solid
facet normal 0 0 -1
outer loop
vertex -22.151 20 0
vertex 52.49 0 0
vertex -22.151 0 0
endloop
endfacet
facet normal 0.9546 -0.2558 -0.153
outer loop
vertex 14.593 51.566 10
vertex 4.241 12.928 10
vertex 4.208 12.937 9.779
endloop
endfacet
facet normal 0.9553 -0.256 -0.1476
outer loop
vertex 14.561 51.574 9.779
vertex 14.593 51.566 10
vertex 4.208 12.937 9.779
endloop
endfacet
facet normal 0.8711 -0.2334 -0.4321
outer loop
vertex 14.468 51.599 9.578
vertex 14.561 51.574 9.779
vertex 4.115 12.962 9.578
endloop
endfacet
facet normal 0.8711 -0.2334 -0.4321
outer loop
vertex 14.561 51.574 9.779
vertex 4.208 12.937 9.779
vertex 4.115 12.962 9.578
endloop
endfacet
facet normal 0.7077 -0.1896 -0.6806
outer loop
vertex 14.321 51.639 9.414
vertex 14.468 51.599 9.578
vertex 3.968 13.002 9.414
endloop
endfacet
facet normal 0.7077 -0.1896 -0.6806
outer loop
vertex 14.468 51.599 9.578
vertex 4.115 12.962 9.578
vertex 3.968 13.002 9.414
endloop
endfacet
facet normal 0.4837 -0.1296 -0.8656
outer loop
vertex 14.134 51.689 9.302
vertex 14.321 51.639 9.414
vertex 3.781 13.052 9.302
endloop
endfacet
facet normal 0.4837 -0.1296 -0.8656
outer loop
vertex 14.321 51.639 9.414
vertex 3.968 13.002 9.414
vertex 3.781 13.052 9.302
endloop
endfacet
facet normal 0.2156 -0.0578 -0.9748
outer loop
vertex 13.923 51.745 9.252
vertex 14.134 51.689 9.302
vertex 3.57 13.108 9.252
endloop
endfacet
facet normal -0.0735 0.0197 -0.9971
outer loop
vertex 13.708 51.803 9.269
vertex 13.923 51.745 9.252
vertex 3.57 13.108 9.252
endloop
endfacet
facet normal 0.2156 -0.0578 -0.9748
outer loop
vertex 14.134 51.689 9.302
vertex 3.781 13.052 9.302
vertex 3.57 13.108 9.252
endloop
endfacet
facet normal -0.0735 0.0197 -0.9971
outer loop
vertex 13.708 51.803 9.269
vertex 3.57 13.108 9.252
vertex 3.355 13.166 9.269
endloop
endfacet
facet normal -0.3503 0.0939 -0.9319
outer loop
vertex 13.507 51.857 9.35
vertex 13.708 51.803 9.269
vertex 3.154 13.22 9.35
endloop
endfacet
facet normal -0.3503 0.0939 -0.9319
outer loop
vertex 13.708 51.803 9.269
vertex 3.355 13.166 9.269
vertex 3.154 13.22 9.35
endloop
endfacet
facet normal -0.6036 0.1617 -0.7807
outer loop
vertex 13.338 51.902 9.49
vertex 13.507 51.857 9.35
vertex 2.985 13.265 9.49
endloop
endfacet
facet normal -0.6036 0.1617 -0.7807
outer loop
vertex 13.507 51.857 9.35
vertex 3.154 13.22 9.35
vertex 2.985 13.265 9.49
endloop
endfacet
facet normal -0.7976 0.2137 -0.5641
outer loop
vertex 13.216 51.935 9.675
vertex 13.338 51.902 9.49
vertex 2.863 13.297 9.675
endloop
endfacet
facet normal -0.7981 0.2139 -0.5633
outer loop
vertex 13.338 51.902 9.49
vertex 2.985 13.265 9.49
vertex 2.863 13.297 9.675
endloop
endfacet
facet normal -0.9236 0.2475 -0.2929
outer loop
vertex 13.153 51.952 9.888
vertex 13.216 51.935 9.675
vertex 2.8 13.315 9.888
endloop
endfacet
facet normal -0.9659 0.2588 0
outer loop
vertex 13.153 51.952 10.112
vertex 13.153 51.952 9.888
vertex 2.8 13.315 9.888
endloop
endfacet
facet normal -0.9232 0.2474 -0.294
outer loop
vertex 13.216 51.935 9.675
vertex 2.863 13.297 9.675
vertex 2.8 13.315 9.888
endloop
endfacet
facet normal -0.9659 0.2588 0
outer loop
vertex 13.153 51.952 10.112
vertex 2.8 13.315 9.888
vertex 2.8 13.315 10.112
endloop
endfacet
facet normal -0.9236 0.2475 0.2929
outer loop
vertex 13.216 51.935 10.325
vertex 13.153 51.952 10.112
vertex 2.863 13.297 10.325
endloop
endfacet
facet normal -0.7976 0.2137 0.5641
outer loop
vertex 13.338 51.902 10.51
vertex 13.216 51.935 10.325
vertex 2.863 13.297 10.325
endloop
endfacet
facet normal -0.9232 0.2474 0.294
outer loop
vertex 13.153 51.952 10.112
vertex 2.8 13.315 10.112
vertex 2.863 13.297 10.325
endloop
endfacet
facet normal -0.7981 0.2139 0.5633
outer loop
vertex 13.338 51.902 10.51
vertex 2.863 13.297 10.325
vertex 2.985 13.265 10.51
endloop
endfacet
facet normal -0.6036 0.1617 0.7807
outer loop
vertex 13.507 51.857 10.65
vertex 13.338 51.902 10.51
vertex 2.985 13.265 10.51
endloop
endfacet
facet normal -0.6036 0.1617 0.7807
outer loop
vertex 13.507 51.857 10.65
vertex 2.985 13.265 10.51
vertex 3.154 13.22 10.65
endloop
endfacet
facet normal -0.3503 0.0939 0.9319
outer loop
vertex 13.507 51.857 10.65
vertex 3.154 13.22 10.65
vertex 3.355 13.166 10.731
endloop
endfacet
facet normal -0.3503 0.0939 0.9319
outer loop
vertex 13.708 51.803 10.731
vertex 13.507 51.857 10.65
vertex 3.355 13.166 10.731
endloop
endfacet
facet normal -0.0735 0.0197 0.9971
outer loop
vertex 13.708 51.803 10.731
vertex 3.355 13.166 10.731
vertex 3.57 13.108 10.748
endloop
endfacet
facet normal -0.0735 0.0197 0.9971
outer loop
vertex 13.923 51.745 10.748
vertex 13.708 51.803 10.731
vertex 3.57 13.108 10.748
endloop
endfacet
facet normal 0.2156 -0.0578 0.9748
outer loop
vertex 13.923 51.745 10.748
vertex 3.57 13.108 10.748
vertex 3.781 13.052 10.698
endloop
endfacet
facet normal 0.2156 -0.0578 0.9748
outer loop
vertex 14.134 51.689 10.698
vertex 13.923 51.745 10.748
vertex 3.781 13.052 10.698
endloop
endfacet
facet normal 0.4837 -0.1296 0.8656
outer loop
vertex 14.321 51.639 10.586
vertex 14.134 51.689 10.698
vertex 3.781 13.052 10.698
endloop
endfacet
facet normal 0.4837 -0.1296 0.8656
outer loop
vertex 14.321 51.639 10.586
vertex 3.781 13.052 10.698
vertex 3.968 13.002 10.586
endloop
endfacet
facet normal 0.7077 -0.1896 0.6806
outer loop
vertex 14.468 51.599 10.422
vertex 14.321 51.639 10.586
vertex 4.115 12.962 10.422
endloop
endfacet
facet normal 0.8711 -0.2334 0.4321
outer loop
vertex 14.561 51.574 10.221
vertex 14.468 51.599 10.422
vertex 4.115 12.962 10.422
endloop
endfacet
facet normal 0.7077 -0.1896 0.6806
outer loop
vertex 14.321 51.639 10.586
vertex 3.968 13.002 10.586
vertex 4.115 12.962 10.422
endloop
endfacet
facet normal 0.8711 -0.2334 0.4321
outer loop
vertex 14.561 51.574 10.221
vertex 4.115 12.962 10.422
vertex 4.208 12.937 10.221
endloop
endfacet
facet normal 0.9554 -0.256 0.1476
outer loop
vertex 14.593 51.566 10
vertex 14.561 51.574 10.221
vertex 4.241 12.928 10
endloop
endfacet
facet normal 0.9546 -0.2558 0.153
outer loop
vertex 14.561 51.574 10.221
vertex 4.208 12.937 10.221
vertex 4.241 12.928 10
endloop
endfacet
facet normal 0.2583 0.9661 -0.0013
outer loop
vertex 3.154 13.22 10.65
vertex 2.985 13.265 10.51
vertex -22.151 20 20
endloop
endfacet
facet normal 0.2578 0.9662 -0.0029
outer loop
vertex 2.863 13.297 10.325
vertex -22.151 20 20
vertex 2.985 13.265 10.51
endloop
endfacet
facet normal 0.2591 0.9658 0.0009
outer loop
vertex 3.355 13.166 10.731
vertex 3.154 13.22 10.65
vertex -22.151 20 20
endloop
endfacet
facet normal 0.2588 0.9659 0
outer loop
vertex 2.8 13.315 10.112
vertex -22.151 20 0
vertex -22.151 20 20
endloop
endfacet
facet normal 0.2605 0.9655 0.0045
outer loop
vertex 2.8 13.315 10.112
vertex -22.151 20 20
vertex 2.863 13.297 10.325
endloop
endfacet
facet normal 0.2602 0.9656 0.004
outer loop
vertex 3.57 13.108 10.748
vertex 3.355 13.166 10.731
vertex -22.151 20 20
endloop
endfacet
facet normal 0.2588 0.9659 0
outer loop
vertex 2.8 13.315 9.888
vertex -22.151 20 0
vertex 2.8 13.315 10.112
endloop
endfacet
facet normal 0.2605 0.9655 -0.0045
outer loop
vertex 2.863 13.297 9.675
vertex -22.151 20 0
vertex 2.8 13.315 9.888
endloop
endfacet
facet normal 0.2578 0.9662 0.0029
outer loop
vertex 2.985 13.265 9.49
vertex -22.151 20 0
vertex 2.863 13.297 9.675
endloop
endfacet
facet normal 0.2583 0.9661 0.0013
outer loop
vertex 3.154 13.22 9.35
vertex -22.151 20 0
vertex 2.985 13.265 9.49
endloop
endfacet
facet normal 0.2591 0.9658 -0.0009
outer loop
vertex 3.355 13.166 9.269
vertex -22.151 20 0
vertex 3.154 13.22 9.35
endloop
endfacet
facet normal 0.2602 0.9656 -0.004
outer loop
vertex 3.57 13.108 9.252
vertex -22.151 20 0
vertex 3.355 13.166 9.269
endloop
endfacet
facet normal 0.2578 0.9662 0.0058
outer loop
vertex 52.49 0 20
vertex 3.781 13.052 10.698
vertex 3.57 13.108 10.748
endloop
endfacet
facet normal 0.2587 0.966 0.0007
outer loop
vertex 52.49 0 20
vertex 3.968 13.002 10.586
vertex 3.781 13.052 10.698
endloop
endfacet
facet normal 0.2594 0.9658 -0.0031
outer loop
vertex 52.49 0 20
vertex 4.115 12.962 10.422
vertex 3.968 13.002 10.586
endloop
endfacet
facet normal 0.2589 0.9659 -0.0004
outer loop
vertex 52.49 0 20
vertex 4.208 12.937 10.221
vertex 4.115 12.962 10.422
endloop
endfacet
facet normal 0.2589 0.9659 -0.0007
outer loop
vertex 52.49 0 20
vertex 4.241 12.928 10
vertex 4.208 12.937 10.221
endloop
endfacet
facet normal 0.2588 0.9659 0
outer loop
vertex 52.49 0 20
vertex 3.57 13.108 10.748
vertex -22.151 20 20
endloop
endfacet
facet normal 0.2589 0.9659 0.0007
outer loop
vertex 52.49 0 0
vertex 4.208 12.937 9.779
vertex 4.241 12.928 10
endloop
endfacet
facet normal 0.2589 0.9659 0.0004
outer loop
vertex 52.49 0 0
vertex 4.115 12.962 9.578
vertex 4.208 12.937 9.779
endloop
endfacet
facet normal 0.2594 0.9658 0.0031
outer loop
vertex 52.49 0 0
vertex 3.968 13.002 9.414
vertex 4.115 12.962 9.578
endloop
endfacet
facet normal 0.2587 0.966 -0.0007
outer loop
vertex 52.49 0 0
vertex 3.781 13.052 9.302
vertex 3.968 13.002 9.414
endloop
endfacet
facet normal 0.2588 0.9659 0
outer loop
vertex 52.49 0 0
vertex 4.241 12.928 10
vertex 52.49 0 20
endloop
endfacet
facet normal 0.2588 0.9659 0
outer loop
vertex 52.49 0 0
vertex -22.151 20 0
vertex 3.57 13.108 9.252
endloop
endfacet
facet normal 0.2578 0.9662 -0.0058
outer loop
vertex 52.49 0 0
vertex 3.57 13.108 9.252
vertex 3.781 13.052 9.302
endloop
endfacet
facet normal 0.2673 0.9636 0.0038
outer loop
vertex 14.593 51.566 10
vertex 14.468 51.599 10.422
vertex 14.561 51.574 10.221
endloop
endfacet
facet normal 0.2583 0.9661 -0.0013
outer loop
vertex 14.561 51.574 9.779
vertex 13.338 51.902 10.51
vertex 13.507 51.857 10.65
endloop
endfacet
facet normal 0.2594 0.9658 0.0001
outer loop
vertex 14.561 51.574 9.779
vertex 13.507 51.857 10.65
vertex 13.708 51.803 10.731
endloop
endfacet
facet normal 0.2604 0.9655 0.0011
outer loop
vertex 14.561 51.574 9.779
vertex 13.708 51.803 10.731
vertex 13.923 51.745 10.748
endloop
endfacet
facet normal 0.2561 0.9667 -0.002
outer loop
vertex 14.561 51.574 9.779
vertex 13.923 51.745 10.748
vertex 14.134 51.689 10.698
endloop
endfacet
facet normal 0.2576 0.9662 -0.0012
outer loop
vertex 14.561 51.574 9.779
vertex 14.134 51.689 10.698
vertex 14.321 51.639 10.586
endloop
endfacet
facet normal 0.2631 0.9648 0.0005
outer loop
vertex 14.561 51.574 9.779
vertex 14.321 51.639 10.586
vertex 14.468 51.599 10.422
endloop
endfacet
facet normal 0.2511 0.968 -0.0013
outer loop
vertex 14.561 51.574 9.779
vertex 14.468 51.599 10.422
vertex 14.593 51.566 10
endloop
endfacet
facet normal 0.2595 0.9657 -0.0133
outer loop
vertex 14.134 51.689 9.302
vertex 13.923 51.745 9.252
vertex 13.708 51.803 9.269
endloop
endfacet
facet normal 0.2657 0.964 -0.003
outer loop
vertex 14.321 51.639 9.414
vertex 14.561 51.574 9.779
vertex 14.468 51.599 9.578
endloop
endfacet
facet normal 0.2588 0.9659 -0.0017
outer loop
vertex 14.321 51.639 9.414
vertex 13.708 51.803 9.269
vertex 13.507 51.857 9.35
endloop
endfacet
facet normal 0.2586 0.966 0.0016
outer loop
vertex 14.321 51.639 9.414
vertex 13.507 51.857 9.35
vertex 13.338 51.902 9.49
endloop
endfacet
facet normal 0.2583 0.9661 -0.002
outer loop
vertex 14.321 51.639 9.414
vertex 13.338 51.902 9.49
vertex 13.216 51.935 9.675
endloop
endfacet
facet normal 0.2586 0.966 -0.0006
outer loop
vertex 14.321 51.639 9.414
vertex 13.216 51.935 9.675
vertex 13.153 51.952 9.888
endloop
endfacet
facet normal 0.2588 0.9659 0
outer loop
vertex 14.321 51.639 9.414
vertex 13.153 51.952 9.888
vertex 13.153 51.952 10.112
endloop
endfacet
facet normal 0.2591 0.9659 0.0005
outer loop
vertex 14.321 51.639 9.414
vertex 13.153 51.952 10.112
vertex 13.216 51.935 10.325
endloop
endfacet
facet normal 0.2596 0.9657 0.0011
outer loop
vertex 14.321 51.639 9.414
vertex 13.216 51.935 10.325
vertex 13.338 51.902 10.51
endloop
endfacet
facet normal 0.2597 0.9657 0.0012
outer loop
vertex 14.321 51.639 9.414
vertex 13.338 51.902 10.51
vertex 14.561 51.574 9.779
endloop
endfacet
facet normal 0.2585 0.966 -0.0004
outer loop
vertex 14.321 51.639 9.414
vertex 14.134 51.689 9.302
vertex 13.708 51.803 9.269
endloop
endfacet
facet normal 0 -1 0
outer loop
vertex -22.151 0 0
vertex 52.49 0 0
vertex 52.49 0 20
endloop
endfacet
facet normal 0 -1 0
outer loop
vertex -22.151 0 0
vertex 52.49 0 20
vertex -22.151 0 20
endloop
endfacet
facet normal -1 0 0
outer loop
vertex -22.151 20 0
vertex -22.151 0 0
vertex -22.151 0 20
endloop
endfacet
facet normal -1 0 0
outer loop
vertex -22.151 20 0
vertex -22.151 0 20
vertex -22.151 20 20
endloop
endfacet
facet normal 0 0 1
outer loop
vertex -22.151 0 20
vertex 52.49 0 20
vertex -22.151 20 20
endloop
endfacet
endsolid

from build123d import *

# Parameters (mm, degrees)
BOSS_EXTRUDE1_DEPTH = 20
SKETCH2_R           = 0.75
BOSS_EXTRUDE2_DEPTH = 40


with BuildPart() as part:
    # Sketch1 → Boss-Extrude1 (new body)
    with BuildSketch(Plane.XY):
        Polygon((-22.150682767, 20), (52.490333384, 0), (-22.150682767, 0), align=None)
    extrude(amount=BOSS_EXTRUDE1_DEPTH)

    # Sketch2 → Boss-Extrude2 (add)
    with BuildSketch(Plane(origin=(3.51618561, 13.122583346, 0), x_dir=(0.96592582628907, -0.25881904510251424, 0), z_dir=(0.2588190451025143, 0.9659258262890701, 0))):
        with Locations((0, -10)):
            Circle(SKETCH2_R)
    extrude(amount=BOSS_EXTRUDE2_DEPTH)


solid = part.part
